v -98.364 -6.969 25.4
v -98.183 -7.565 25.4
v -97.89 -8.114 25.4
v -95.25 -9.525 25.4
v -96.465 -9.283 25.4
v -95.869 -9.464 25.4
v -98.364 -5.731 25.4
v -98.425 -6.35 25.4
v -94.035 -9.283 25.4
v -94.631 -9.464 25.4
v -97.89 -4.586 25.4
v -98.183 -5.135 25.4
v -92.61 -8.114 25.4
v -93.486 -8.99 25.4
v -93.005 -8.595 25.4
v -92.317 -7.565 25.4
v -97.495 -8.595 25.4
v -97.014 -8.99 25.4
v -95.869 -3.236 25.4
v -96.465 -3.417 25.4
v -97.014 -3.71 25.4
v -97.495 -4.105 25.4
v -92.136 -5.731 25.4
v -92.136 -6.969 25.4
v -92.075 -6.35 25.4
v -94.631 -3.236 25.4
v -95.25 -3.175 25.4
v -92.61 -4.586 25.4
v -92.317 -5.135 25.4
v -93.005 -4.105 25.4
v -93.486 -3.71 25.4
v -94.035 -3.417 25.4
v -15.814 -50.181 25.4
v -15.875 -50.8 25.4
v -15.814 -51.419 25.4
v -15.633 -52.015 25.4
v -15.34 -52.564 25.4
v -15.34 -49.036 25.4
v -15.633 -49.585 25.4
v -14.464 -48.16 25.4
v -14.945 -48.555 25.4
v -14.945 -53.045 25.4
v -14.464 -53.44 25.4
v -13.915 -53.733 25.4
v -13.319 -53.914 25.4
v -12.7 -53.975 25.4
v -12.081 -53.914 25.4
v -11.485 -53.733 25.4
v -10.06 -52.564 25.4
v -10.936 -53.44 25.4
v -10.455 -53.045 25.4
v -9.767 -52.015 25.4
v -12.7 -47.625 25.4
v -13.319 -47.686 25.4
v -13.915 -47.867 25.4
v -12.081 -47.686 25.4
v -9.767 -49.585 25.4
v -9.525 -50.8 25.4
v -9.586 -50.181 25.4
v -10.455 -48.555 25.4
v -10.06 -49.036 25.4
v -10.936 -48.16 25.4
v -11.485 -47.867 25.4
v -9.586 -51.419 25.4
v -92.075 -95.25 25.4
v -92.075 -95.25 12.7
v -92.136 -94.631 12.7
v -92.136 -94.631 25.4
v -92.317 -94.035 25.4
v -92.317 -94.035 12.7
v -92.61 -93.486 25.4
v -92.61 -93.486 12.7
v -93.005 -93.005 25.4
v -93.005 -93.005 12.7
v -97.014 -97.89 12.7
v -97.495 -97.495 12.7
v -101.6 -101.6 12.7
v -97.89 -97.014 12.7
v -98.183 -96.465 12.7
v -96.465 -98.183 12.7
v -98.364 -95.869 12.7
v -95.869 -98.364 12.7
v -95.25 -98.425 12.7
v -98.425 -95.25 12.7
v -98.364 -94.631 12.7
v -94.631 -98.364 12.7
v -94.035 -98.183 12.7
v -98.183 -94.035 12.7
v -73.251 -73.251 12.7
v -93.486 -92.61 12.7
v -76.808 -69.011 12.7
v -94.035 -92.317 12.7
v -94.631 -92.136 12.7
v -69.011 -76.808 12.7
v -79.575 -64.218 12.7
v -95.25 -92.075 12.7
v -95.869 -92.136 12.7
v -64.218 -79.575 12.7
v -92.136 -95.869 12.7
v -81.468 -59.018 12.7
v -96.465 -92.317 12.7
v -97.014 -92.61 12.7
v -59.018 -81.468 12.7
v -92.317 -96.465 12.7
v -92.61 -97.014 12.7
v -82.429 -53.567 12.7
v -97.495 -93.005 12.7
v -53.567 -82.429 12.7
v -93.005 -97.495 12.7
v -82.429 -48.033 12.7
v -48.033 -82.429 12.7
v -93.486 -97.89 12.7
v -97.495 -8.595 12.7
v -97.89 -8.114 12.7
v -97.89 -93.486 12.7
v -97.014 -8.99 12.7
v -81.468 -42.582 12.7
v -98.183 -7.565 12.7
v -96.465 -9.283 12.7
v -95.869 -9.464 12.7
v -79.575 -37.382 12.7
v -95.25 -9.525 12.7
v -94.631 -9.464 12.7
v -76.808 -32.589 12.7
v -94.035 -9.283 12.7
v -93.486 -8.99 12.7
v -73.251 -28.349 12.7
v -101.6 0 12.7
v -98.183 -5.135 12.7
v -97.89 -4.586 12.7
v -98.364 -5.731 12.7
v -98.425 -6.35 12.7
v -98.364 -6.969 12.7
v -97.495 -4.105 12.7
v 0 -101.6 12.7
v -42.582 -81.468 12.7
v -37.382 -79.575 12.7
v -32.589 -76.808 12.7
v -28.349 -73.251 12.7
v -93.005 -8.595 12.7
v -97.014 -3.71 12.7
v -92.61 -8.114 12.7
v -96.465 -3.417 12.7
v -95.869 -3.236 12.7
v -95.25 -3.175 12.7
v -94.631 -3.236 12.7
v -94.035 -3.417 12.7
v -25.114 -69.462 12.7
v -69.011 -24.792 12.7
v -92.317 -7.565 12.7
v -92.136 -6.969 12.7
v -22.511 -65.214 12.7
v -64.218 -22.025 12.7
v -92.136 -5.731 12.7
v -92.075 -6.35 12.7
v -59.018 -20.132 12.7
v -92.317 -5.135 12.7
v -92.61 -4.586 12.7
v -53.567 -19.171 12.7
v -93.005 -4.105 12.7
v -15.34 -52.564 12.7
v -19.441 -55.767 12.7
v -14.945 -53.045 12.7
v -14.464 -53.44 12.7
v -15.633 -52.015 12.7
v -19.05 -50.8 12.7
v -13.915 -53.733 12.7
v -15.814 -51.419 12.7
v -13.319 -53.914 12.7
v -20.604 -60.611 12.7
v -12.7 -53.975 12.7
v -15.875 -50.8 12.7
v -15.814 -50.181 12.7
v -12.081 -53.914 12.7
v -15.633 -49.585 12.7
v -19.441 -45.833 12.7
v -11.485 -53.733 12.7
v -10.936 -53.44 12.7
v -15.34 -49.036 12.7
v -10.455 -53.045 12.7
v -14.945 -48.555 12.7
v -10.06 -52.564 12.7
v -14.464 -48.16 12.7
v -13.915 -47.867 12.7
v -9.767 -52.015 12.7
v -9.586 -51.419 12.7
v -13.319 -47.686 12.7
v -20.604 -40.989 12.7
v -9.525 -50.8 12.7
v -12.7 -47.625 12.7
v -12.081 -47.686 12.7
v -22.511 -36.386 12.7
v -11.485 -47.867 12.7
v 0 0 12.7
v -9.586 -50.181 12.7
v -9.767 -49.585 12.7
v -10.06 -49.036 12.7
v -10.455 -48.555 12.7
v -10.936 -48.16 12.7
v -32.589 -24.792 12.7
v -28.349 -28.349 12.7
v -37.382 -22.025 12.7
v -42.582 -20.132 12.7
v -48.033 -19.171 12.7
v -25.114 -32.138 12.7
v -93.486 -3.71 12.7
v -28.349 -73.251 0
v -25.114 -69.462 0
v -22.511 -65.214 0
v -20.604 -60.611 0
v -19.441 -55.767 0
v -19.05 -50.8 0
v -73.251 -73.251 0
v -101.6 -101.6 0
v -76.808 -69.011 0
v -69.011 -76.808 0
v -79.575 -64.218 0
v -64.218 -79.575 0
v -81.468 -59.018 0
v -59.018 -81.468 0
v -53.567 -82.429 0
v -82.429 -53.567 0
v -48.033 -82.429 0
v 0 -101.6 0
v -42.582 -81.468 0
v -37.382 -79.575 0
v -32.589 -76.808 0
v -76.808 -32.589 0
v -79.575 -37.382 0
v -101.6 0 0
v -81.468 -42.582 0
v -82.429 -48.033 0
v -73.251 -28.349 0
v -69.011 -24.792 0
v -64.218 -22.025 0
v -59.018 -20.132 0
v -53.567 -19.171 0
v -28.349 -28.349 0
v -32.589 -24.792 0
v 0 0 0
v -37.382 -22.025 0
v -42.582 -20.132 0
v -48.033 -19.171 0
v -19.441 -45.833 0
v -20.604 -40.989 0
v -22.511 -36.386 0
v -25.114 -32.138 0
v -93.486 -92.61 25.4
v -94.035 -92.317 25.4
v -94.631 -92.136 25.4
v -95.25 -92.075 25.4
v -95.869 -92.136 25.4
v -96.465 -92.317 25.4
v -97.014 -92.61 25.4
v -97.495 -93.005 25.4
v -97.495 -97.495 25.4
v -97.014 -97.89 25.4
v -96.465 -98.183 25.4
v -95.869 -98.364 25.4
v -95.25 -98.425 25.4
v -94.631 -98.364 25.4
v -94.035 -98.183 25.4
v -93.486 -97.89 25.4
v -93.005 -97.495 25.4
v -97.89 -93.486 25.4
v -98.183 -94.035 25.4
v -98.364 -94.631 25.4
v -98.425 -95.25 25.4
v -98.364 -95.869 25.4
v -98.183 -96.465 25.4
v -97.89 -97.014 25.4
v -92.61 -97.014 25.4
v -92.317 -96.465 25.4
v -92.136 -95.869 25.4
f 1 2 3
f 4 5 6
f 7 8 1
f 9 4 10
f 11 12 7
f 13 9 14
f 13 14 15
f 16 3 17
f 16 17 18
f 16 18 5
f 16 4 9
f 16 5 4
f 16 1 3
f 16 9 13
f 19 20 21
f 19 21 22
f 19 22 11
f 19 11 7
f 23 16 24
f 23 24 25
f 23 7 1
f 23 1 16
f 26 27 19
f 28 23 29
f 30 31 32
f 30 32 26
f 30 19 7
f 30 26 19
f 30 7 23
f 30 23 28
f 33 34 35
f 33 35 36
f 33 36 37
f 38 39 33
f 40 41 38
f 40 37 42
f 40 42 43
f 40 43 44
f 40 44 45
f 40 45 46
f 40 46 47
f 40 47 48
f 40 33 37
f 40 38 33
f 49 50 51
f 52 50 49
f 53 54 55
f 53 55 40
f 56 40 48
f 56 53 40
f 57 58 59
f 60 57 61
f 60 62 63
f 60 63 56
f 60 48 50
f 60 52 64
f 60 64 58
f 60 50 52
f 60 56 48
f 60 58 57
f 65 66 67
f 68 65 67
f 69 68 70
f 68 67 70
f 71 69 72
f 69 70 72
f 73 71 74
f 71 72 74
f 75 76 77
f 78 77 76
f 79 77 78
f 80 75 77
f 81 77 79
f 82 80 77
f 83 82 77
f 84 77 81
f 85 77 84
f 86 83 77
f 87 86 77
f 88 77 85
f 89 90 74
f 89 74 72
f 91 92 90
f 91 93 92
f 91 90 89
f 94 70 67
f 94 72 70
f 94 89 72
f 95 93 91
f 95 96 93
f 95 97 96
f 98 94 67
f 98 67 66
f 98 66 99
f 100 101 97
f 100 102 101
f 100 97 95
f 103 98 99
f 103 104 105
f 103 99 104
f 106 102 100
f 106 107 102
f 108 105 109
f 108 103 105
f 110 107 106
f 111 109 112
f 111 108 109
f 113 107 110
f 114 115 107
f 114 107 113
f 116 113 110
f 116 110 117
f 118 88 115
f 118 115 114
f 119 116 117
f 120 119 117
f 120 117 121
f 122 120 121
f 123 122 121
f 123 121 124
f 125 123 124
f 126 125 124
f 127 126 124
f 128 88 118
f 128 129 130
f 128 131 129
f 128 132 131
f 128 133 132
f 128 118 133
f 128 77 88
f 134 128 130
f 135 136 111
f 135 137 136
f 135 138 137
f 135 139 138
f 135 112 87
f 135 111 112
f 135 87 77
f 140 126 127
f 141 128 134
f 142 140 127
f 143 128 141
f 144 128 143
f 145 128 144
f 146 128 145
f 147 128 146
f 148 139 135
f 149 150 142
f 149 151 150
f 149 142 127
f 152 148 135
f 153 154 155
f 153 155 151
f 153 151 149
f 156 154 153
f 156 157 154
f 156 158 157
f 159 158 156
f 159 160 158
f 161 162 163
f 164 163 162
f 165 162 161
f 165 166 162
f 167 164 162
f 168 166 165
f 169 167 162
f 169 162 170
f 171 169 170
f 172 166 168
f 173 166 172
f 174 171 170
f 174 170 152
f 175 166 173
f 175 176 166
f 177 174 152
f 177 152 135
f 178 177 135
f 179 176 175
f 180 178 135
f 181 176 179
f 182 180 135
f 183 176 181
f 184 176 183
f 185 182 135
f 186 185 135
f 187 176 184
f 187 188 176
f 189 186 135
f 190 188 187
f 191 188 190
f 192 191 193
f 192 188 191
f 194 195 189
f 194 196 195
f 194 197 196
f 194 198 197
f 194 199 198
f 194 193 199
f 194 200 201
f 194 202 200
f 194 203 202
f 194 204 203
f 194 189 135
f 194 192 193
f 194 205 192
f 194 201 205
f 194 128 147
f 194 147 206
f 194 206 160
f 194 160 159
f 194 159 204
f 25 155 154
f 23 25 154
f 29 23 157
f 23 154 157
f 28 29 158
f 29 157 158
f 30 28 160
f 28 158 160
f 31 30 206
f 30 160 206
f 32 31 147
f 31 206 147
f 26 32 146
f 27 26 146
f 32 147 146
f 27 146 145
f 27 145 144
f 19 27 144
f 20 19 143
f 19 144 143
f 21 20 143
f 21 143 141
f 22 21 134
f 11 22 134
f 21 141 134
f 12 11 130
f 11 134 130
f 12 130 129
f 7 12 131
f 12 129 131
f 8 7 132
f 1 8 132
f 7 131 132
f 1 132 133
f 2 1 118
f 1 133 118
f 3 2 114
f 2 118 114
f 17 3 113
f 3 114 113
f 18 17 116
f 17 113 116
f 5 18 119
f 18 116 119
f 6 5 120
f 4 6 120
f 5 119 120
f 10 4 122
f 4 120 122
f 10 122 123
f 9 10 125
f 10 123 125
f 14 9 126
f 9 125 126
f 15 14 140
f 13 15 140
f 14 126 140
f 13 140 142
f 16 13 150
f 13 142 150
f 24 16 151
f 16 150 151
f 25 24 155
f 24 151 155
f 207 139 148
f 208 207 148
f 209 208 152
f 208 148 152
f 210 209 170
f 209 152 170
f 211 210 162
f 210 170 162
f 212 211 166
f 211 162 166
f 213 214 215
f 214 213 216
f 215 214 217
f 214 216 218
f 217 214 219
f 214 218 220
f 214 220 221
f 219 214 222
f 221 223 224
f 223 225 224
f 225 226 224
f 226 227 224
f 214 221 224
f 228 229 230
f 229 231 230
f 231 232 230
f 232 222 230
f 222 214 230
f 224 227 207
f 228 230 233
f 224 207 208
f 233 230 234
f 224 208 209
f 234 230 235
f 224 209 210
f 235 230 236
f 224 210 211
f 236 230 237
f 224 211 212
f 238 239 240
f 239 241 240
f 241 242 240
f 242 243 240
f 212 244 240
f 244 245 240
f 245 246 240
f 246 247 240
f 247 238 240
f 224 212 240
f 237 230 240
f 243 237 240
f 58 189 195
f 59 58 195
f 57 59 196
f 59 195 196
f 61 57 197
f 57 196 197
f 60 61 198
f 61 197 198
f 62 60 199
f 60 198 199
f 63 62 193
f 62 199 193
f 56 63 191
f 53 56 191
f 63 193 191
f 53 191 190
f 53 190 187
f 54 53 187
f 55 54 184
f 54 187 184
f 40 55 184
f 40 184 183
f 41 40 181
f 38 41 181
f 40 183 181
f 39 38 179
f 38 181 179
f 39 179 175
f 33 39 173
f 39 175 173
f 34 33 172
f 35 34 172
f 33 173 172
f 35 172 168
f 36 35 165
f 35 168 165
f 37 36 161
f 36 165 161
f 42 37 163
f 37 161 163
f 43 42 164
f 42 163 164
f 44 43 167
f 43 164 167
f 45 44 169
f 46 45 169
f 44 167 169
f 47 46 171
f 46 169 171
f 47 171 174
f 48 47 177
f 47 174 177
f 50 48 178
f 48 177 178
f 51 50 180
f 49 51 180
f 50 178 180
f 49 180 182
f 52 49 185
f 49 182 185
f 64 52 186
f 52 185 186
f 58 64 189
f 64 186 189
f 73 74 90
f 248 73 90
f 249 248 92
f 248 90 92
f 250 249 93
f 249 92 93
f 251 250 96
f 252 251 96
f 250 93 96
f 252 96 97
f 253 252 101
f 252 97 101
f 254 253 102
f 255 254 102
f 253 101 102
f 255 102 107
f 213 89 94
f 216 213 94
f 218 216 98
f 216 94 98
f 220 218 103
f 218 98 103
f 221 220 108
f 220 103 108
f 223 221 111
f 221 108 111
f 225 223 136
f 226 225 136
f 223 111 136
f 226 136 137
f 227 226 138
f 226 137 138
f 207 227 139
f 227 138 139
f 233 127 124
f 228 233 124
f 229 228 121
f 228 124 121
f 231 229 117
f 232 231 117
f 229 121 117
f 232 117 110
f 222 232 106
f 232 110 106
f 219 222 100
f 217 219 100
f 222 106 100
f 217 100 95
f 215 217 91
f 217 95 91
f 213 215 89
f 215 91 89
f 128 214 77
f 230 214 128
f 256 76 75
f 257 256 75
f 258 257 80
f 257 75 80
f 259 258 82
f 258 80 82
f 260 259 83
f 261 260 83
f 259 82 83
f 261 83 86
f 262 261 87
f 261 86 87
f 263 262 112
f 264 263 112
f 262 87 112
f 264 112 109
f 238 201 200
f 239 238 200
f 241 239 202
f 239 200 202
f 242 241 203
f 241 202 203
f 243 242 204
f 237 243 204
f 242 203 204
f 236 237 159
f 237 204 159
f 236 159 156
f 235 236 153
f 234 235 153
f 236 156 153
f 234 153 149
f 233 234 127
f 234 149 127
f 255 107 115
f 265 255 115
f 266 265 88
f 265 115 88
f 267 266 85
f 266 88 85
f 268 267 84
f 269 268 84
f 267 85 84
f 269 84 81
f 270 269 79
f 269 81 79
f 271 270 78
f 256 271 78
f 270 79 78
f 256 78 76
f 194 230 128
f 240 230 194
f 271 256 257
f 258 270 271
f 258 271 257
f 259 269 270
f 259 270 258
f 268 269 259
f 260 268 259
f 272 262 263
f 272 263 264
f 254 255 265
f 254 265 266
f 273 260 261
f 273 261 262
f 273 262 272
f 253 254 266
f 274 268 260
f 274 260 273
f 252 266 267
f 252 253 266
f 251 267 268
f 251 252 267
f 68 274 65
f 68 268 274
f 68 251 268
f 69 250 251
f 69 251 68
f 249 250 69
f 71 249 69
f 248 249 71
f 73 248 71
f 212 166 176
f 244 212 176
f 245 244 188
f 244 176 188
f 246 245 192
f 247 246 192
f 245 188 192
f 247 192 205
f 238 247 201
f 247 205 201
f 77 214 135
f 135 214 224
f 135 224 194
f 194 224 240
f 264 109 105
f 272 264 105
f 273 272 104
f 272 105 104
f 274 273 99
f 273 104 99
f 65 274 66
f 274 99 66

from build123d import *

# Parameters (mm, degrees)
F0_W     = 101.6
F0_H     = 101.6
F1_DEPTH = 12.7
F2_R     = 3.175
F3_DEPTH = 12.7
F4_R     = 3.175
F5_DEPTH = 12.7
F7_DEPTH = 25.4


with BuildPart() as f1:
    # F0 (on Top) → F1 (new body)
    with BuildSketch(Plane.XY):
        with Locations((-50.8, -50.8)):
            Rectangle(F0_W, F0_H)
    extrude(amount=F1_DEPTH)

    # F2 (on face) → F3 (join)
    with BuildSketch(Plane.XY.offset(12.7)):
        with BuildLine():
            Line((-95.25, -95.25), (-97.4950640303, -97.4950640303))
            ThreePointArc((-97.4950640303, -97.4950640303), (-95.25, -98.425), (-93.0049359697, -97.4950640303))
            Line((-93.0049359697, -97.4950640303), (-95.25, -95.25))
        make_face()
        with BuildLine():
            ThreePointArc((-93.0049359697, -93.0049359697), (-95.25, -92.075), (-97.4950640303, -93.0049359697))
            Line((-97.4950640303, -93.0049359697), (-95.25, -95.25))
            Line((-95.25, -95.25), (-93.0049359697, -93.0049359697))
        make_face()
        with BuildLine():
            Line((-95.25, -95.25), (-93.0049359697, -97.4950640303))
            ThreePointArc((-93.0049359697, -97.4950640303), (-92.3166824843, -96.4650198978), (-92.075, -95.25))
            ThreePointArc((-92.075, -95.25), (-92.3166824843, -94.0349801022), (-93.0049359697, -93.0049359697))
            Line((-93.0049359697, -93.0049359697), (-95.25, -95.25))
        make_face()
        with BuildLine():
            ThreePointArc((-97.4950640303, -93.0049359697), (-98.425, -95.25), (-97.4950640303, -97.4950640303))
            Line((-97.4950640303, -97.4950640303), (-95.25, -95.25))
            Line((-95.25, -95.25), (-97.4950640303, -93.0049359697))
        make_face()
        with Locations((-95.25, -6.35)):
            Circle(F2_R)
    extrude(amount=F3_DEPTH)

    # F4 (on face) → F5 (join)
    with BuildSketch(Plane.XY.offset(12.7)):
        with Locations((-12.7, -50.8)):
            Circle(F4_R)
    extrude(amount=F5_DEPTH)

    # F6 (on face) → F7 (cut)
    with BuildSketch(Plane.XY.offset(12.7)):
        with BuildLine():
            ThreePointArc((-73.2506403027, -28.3493596973), (-82.55, -50.8), (-73.2506403027, -73.2506403027))
            Line((-73.2506403027, -73.2506403027), (-50.8, -50.8))
            Line((-50.8, -50.8), (-73.2506403027, -28.3493596973))
        make_face()
        with BuildLine():
            Line((-50.8, -50.8), (-28.3493596973, -28.3493596973))
            ThreePointArc((-28.3493596973, -28.3493596973), (-50.8, -19.05), (-73.2506403027, -28.3493596973))
            Line((-73.2506403027, -28.3493596973), (-50.8, -50.8))
        make_face()
        with BuildLine():
            Line((-50.8, -50.8), (-28.3493596973, -73.2506403027))
            ThreePointArc((-28.3493596973, -73.2506403027), (-21.4668248428, -62.9501989776), (-19.05, -50.8))
            ThreePointArc((-19.05, -50.8), (-21.4668248428, -38.6498010224), (-28.3493596973, -28.3493596973))
            Line((-28.3493596973, -28.3493596973), (-50.8, -50.8))
        make_face()
        with BuildLine():
            ThreePointArc((-73.2506403027, -73.2506403027), (-50.8, -82.55), (-28.3493596973, -73.2506403027))
            Line((-28.3493596973, -73.2506403027), (-50.8, -50.8))
            Line((-50.8, -50.8), (-73.2506403027, -73.2506403027))
        make_face()
    extrude(amount=-F7_DEPTH, mode=Mode.SUBTRACT)


solid = f1.part
